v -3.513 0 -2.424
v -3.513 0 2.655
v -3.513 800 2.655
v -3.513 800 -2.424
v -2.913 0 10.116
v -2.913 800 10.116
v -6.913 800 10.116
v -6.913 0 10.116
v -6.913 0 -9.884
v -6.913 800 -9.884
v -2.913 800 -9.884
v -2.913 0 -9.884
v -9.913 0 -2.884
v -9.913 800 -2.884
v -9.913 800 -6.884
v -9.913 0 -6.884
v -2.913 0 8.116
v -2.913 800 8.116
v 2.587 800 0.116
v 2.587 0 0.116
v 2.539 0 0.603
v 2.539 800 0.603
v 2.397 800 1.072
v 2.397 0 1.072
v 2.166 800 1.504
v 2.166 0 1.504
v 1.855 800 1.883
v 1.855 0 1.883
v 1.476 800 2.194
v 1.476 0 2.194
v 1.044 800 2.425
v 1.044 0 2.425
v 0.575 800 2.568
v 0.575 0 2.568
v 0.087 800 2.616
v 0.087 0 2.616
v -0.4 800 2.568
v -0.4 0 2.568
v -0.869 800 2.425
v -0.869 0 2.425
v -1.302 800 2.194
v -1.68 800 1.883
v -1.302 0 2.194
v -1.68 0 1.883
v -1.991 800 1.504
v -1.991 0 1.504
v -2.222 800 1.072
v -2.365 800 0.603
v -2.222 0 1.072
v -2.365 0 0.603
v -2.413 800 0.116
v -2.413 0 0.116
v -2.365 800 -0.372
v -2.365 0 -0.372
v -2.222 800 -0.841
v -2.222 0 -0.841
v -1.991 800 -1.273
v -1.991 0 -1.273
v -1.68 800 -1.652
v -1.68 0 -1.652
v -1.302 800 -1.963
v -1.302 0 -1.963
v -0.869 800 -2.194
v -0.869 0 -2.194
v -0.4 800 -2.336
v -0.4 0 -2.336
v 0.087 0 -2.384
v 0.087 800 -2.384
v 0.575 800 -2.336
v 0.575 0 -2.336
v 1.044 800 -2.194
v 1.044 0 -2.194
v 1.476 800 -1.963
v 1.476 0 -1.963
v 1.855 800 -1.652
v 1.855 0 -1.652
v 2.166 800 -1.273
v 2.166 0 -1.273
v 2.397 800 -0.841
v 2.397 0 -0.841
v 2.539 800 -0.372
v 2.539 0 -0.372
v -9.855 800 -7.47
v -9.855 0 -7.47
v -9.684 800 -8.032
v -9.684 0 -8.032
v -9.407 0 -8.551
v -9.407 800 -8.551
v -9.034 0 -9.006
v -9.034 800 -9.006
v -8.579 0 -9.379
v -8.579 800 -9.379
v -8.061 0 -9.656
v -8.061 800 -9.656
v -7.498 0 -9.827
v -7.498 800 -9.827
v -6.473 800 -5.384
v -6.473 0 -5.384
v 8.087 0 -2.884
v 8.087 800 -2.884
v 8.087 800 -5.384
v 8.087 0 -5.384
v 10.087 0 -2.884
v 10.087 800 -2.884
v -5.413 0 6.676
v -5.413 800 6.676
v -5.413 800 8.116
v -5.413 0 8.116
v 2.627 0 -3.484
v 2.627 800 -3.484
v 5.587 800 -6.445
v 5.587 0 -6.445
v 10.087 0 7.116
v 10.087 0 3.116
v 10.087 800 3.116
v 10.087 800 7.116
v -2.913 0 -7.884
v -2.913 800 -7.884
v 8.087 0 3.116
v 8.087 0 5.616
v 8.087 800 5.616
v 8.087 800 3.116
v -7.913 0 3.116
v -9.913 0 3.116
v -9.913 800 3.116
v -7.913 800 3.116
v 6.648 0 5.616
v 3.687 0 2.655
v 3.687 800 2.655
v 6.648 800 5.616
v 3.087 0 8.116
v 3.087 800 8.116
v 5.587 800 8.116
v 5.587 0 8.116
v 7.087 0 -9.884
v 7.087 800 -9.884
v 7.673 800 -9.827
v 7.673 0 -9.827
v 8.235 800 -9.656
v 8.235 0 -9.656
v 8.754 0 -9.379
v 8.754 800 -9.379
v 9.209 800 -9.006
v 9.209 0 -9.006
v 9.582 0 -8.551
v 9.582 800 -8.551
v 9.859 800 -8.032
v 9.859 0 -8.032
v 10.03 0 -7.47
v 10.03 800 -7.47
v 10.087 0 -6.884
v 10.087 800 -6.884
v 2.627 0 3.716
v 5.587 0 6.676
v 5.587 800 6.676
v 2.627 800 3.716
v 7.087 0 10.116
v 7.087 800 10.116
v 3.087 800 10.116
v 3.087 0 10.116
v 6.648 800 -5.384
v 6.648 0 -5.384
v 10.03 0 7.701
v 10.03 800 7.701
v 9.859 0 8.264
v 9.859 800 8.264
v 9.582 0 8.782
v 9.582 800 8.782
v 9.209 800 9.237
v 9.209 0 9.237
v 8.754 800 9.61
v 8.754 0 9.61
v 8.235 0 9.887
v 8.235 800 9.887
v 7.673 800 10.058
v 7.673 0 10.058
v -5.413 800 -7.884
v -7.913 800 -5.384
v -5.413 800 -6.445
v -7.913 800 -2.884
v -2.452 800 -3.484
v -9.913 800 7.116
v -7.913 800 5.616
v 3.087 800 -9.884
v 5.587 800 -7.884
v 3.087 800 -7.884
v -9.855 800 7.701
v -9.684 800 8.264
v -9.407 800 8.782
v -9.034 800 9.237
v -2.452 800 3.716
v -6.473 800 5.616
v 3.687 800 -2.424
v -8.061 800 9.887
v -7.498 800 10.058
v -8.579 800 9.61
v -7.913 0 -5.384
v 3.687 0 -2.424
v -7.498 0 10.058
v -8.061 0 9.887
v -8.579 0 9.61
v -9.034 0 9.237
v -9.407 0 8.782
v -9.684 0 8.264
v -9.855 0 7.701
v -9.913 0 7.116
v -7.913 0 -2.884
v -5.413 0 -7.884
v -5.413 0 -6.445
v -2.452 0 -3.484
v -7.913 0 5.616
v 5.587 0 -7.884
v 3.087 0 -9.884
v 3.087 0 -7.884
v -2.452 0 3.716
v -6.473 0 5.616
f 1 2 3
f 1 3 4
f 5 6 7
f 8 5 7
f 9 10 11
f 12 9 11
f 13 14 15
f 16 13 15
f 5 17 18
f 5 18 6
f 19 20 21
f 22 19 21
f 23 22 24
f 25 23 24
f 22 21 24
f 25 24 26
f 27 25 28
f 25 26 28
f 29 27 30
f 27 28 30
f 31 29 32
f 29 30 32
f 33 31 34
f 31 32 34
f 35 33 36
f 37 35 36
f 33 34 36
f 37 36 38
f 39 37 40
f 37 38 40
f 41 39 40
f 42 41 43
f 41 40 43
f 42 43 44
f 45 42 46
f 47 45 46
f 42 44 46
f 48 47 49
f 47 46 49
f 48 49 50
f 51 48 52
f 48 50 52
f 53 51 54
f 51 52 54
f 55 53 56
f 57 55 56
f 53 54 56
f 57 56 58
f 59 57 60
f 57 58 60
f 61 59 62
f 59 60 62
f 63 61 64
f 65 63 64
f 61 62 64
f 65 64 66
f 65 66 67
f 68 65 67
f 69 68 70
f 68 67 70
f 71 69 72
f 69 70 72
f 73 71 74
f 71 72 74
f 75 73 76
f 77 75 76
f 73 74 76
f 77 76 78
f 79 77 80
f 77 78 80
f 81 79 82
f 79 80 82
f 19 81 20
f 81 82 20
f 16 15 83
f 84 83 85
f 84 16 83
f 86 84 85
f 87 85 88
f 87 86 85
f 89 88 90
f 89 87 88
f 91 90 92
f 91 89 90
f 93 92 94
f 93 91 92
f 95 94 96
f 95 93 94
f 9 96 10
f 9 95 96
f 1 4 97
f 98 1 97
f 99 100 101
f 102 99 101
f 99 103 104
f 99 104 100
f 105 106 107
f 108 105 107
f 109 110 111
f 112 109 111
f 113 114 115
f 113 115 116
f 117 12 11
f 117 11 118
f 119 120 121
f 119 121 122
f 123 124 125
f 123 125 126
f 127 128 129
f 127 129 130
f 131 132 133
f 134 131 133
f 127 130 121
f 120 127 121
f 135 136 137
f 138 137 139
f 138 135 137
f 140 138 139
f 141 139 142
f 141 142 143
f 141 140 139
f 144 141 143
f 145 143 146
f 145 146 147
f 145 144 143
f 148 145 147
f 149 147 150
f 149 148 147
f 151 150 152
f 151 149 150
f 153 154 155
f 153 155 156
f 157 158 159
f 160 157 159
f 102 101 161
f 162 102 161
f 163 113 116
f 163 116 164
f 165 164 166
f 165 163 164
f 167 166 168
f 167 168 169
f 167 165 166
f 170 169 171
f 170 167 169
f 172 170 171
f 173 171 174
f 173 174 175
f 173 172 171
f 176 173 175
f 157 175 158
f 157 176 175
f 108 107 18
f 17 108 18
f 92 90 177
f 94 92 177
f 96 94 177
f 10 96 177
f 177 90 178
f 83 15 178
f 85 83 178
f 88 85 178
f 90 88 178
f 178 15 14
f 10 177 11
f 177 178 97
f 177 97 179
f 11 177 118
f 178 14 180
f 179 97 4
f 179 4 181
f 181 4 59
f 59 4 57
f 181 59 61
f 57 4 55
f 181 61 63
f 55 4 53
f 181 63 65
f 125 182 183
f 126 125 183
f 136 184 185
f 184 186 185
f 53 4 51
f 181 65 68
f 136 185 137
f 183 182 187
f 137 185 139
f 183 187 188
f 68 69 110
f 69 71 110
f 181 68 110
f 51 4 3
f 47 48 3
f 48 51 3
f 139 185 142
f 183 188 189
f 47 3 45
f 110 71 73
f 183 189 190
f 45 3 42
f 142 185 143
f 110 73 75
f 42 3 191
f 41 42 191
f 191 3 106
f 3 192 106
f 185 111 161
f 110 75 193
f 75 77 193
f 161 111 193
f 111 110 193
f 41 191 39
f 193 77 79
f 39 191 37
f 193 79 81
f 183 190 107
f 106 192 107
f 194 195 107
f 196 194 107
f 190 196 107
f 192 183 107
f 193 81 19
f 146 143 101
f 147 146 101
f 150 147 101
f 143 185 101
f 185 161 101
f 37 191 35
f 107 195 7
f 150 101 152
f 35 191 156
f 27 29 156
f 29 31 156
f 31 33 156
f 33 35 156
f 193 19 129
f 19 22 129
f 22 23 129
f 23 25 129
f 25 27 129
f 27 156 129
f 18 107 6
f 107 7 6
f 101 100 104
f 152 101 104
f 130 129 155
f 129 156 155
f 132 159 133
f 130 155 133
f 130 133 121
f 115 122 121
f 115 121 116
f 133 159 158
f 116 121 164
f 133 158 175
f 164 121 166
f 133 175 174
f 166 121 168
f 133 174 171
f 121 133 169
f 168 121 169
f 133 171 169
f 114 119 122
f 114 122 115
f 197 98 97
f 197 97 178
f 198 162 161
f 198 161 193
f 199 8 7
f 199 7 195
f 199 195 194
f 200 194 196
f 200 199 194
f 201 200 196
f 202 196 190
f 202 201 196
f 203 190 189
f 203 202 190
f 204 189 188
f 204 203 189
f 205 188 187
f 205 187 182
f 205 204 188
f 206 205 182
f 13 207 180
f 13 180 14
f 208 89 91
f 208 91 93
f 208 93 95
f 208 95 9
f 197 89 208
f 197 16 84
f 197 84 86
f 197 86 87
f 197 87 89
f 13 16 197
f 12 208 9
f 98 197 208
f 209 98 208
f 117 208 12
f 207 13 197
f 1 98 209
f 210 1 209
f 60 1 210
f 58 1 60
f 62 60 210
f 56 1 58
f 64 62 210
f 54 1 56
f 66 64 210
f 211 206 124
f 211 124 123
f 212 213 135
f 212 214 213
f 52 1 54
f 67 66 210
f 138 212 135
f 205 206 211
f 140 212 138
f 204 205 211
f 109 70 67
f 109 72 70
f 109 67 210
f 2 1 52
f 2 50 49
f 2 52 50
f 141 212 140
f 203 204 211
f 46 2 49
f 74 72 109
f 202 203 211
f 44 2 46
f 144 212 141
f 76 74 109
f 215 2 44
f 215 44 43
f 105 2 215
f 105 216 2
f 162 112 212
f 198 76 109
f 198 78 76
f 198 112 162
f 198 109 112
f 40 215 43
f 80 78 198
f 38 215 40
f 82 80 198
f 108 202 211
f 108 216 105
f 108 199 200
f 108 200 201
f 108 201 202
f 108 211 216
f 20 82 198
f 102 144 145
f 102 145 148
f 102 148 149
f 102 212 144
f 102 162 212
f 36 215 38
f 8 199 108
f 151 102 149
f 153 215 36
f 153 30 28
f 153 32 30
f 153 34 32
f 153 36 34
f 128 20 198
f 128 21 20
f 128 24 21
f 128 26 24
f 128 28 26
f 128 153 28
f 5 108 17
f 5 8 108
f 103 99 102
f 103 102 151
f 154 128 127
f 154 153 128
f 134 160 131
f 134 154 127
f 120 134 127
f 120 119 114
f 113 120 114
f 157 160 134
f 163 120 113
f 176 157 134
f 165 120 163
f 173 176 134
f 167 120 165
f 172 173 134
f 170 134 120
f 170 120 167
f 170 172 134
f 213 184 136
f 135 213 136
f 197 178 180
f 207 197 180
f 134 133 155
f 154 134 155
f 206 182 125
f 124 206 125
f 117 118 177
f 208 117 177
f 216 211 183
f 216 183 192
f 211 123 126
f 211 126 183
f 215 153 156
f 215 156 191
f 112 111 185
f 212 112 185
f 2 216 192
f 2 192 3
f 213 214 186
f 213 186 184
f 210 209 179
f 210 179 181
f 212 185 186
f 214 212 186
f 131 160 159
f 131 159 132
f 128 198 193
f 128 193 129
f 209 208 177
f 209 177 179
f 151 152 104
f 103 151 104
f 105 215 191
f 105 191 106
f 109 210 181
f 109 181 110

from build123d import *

# Parameters (mm, degrees)
F0_R     = 2.5
F1_DEPTH = 800


with BuildPart() as f1:
    # F0 (on Front) → F1 (new body)
    with BuildSketch(Plane.XZ):
        with BuildLine():
            Line((3.087302, -9.884439), (7.087302, -9.884439))
            ThreePointArc((7.087302, -9.884439), (9.208622, -9.00576), (10.087302, -6.884439))
            Line((10.087302, -6.884439), (10.087302, -2.884439))
            Line((10.087302, -2.884439), (8.087302, -2.884439))
            Line((8.087302, -2.884439), (8.087302, -5.384439))
            Line((8.087302, -5.384439), (8.087302, -6.823779))
            Line((8.087302, -6.823779), (6.647962, -5.384439))
            Line((6.647962, -5.384439), (3.687302, -2.423779))
            Line((3.687302, -2.423779), (3.687302, 2.654901))
            Line((3.687302, 2.654901), (6.647962, 5.615561))
            Line((6.647962, 5.615561), (8.087302, 7.054901))
            Line((8.087302, 7.054901), (8.087302, 5.615561))
            Line((8.087302, 5.615561), (8.087302, 3.115561))
            Line((8.087302, 3.115561), (10.087302, 3.115561))
            Line((10.087302, 3.115561), (10.087302, 7.115561))
            ThreePointArc((10.087302, 7.115561), (9.208622, 9.236881), (7.087302, 10.115561))
            Line((7.087302, 10.115561), (3.087302, 10.115561))
            Line((3.087302, 10.115561), (3.087302, 8.115561))
            Line((3.087302, 8.115561), (5.587302, 8.115561))
            Line((5.587302, 8.115561), (7.026641, 8.115561))
            Line((7.026641, 8.115561), (5.587302, 6.676221))
            Line((5.587302, 6.676221), (2.626641, 3.715561))
            Line((2.626641, 3.715561), (-2.452038, 3.715561))
            Line((-2.452038, 3.715561), (-5.412698, 6.676221))
            Line((-5.412698, 6.676221), (-6.852038, 8.115561))
            Line((-6.852038, 8.115561), (-5.412698, 8.115561))
            Line((-5.412698, 8.115561), (-2.912698, 8.115561))
            Line((-2.912698, 8.115561), (-2.912698, 10.115561))
            Line((-2.912698, 10.115561), (-6.912698, 10.115561))
            ThreePointArc((-6.912698, 10.115561), (-9.034019, 9.236881), (-9.912698, 7.115561))
            Line((-9.912698, 7.115561), (-9.912698, 3.115561))
            Line((-9.912698, 3.115561), (-7.912698, 3.115561))
            Line((-7.912698, 3.115561), (-7.912698, 5.615561))
            Line((-7.912698, 5.615561), (-7.912698, 7.054901))
            Line((-7.912698, 7.054901), (-6.473359, 5.615561))
            Line((-6.473359, 5.615561), (-3.512698, 2.654901))
            Line((-3.512698, 2.654901), (-3.512698, -2.423779))
            Line((-3.512698, -2.423779), (-6.473359, -5.384439))
            Line((-6.473359, -5.384439), (-7.912698, -6.823779))
            Line((-7.912698, -6.823779), (-7.912698, -5.384439))
            Line((-7.912698, -5.384439), (-7.912698, -2.884439))
            Line((-7.912698, -2.884439), (-9.912698, -2.884439))
            Line((-9.912698, -2.884439), (-9.912698, -6.884439))
            ThreePointArc((-9.912698, -6.884439), (-9.034019, -9.00576), (-6.912698, -9.884439))
            Line((-6.912698, -9.884439), (-2.912698, -9.884439))
            Line((-2.912698, -9.884439), (-2.912698, -7.884439))
            Line((-2.912698, -7.884439), (-5.412698, -7.884439))
            Line((-5.412698, -7.884439), (-6.852038, -7.884439))
            Line((-6.852038, -7.884439), (-5.412698, -6.445099))
            Line((-5.412698, -6.445099), (-2.452038, -3.484439))
            Line((-2.452038, -3.484439), (2.626641, -3.484439))
            Line((2.626641, -3.484439), (5.587302, -6.445099))
            Line((5.587302, -6.445099), (7.026641, -7.884439))
            Line((7.026641, -7.884439), (5.587302, -7.884439))
            Line((5.587302, -7.884439), (3.087302, -7.884439))
            Line((3.087302, -7.884439), (3.087302, -9.884439))
        make_face()
        with Locations((0.087302, 0.115561)):
            Circle(F0_R, mode=Mode.SUBTRACT)
        Polygon((5.587302, -6.445099), (5.587302, -7.884439), (7.026641, -7.884439), align=None)
        Polygon((8.087302, -6.823779), (8.087302, -5.384439), (6.647962, -5.384439), align=None)
        Polygon((-5.412698, -7.884439), (-5.412698, -6.445099), (-6.852038, -7.884439), align=None)
        Polygon((8.087302, 7.054901), (6.647962, 5.615561), (8.087302, 5.615561), align=None)
        Polygon((-6.473359, -5.384439), (-7.912698, -5.384439), (-7.912698, -6.823779), align=None)
        Polygon((7.026641, 8.115561), (5.587302, 8.115561), (5.587302, 6.676221), align=None)
        Polygon((-7.912698, 5.615561), (-6.473359, 5.615561), (-7.912698, 7.054901), align=None)
        Polygon((-6.852038, 8.115561), (-5.412698, 6.676221), (-5.412698, 8.115561), align=None)
    extrude(amount=-F1_DEPTH)


solid = f1.part
